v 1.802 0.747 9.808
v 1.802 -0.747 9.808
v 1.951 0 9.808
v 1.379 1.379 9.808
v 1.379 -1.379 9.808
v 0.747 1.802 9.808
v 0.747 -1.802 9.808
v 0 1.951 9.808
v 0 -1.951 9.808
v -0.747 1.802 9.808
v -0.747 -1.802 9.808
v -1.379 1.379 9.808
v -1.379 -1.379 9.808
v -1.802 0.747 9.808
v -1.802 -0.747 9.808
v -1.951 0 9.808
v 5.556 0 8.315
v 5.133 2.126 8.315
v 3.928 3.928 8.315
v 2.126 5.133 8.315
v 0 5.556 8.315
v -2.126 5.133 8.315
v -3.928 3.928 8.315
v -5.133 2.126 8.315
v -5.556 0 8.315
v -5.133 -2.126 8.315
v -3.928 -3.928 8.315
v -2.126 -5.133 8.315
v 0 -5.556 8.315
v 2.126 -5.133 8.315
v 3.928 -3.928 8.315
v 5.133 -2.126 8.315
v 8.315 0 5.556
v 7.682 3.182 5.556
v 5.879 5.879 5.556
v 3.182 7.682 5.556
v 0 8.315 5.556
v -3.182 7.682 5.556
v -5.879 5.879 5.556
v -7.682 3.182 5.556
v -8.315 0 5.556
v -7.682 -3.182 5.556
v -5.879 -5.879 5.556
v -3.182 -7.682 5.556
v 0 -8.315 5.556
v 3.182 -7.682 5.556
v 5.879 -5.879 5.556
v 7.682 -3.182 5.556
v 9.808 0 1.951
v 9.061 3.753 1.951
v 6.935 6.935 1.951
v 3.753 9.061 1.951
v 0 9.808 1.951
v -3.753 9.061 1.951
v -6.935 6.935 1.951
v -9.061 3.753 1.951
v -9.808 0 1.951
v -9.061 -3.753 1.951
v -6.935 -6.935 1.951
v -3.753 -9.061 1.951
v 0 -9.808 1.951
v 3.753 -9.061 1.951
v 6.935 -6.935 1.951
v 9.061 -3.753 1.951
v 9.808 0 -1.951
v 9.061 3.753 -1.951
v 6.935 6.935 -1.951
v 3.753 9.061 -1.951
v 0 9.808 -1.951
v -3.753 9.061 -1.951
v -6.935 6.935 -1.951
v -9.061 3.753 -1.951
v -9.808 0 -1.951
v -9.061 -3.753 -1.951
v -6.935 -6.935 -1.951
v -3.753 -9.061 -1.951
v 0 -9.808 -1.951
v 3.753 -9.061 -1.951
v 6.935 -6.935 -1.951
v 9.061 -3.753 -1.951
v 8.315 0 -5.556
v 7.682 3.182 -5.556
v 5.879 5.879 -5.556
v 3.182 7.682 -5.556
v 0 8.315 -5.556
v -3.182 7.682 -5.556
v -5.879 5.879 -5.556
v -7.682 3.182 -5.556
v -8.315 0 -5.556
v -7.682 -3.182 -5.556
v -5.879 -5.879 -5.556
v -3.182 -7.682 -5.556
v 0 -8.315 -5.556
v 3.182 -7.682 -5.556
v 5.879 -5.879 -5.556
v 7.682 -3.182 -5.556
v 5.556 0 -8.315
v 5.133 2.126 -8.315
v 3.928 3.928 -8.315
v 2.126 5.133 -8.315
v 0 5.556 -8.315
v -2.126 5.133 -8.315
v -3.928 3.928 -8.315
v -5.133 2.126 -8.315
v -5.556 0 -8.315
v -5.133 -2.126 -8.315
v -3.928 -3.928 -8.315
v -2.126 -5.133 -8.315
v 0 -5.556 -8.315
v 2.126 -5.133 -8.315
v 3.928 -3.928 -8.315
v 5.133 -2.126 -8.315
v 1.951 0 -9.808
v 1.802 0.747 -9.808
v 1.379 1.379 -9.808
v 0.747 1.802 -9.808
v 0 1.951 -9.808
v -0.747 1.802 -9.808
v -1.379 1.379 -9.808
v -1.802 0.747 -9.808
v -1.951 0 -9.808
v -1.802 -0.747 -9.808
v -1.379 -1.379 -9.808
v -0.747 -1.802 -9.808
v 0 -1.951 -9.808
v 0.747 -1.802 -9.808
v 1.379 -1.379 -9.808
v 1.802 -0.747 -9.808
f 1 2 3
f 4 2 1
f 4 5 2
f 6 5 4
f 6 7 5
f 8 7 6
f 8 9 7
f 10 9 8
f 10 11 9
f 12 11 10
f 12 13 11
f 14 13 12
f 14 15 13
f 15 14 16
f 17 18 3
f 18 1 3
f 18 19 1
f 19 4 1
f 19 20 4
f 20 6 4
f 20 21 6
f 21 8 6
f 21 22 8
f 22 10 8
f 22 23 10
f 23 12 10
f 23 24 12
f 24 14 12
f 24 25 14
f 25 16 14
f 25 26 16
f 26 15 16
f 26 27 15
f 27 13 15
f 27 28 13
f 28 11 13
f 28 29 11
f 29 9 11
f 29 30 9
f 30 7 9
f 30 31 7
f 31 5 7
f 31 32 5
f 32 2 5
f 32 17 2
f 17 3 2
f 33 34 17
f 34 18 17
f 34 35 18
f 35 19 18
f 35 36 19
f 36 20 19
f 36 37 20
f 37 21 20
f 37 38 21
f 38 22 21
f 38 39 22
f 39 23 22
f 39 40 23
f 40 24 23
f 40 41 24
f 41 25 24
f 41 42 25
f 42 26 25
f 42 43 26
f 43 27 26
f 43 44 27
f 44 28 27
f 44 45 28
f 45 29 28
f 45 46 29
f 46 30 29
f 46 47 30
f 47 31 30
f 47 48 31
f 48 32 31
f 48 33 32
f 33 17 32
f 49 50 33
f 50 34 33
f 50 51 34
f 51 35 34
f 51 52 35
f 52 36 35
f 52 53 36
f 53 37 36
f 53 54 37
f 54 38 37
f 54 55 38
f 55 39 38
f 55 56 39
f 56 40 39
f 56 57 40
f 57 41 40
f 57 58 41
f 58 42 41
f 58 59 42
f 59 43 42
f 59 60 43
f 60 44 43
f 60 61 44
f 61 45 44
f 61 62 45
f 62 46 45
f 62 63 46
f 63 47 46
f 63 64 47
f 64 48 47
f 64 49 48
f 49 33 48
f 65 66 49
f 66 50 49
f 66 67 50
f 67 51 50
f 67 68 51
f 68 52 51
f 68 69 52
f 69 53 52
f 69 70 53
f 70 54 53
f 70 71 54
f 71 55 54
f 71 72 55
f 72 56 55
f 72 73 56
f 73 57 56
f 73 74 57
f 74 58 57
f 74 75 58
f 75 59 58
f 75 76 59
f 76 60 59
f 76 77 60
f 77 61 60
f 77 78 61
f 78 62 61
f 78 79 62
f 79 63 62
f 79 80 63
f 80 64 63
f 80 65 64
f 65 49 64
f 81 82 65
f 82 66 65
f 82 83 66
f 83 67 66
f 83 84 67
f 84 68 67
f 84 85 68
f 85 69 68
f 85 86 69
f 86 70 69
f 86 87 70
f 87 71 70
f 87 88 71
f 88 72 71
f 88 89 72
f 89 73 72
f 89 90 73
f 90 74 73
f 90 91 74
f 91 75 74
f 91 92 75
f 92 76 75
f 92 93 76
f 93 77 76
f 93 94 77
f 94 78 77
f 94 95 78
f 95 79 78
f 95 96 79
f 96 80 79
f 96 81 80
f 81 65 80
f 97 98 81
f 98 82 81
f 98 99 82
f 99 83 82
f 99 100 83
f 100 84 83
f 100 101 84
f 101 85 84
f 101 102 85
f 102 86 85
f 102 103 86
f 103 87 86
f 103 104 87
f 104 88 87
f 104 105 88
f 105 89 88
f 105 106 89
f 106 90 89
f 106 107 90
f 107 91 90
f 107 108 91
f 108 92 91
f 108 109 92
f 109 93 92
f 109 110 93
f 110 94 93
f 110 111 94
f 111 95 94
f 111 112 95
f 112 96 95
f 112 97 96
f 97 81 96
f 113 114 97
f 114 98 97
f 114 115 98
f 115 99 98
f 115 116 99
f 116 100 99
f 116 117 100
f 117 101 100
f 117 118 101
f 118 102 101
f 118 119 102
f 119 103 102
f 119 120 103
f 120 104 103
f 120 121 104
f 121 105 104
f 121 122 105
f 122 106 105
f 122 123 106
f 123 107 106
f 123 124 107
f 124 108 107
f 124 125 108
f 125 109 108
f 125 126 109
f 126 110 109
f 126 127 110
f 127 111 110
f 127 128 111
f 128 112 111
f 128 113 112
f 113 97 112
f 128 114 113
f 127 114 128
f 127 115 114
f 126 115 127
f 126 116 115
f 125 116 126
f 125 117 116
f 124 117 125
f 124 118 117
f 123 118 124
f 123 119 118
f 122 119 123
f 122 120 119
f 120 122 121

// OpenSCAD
// file: util.scad
function accurate_diam(diam,sides) = 1 / cos(180/sides) / 2 * diam;

module hole(diam,len,sides=8) {
  rotate([0,0,180/sides]) {
    cylinder(r=accurate_diam(diam,sides),h=len,center=true,$fn=sides);
  }
}

module accurate_circle(diam,sides=8) {
  rotate([0,0,180/sides]) {
    circle(r=accurate_diam(diam,sides),center=true,$fn=sides);
  }
}

module debug_axes() {
  color("red") {
    translate([50,0,0]) cube([100,.2,.2],center=true);
    translate([0,50,0]) cube([.2,100,.2],center=true);
    translate([0,0,50]) cube([.2,.2,100],center=true);
  }
}
// main file
include <util.scad>;

module screw_mount() {
  large_diam = 30;
  small_diam = 10;

  module body() {
    hull() {
      cylinder(r=large_diam/2,h=20,center=true);
      cylinder(r=small_diam/2,h=40,center=true);
      translate([large_diam/4,0,0]) {
        cube([large_diam/2,large_diam,20],center=true);
        cube([large_diam/2,small_diam,40],center=true);
      }
    }
  }

  module holes() {
    hole_spacing = 10;
    m3_diam      = 3.1;
    m3_nut_diam  = 5.5;
    m3_nut_thickness = 2;

    for(side=[1,-1]) {
      translate([large_diam/4,0,hole_spacing/2*side]) {
        rotate([90,0,0]) {
          hole(m3_diam,large_diam+1,6);
          translate([0,0,large_diam/2]) {
            hole(m3_nut_diam,m3_nut_thickness,6);
          }
        }
      }
    }
  }

  difference() {
    body();
    holes();
  }
}

rotate([0,90,0]) {
  //screw_mount();
}

/*
diam = 10;
intersection() {
  translate([diam/4,0,0]) {
    hole(diam,10+1,36);
  }
  translate([-diam/4,0,0]) {
    hole(diam,10,36);
  }
}
*/

sphere(r=10,$fn=16);
